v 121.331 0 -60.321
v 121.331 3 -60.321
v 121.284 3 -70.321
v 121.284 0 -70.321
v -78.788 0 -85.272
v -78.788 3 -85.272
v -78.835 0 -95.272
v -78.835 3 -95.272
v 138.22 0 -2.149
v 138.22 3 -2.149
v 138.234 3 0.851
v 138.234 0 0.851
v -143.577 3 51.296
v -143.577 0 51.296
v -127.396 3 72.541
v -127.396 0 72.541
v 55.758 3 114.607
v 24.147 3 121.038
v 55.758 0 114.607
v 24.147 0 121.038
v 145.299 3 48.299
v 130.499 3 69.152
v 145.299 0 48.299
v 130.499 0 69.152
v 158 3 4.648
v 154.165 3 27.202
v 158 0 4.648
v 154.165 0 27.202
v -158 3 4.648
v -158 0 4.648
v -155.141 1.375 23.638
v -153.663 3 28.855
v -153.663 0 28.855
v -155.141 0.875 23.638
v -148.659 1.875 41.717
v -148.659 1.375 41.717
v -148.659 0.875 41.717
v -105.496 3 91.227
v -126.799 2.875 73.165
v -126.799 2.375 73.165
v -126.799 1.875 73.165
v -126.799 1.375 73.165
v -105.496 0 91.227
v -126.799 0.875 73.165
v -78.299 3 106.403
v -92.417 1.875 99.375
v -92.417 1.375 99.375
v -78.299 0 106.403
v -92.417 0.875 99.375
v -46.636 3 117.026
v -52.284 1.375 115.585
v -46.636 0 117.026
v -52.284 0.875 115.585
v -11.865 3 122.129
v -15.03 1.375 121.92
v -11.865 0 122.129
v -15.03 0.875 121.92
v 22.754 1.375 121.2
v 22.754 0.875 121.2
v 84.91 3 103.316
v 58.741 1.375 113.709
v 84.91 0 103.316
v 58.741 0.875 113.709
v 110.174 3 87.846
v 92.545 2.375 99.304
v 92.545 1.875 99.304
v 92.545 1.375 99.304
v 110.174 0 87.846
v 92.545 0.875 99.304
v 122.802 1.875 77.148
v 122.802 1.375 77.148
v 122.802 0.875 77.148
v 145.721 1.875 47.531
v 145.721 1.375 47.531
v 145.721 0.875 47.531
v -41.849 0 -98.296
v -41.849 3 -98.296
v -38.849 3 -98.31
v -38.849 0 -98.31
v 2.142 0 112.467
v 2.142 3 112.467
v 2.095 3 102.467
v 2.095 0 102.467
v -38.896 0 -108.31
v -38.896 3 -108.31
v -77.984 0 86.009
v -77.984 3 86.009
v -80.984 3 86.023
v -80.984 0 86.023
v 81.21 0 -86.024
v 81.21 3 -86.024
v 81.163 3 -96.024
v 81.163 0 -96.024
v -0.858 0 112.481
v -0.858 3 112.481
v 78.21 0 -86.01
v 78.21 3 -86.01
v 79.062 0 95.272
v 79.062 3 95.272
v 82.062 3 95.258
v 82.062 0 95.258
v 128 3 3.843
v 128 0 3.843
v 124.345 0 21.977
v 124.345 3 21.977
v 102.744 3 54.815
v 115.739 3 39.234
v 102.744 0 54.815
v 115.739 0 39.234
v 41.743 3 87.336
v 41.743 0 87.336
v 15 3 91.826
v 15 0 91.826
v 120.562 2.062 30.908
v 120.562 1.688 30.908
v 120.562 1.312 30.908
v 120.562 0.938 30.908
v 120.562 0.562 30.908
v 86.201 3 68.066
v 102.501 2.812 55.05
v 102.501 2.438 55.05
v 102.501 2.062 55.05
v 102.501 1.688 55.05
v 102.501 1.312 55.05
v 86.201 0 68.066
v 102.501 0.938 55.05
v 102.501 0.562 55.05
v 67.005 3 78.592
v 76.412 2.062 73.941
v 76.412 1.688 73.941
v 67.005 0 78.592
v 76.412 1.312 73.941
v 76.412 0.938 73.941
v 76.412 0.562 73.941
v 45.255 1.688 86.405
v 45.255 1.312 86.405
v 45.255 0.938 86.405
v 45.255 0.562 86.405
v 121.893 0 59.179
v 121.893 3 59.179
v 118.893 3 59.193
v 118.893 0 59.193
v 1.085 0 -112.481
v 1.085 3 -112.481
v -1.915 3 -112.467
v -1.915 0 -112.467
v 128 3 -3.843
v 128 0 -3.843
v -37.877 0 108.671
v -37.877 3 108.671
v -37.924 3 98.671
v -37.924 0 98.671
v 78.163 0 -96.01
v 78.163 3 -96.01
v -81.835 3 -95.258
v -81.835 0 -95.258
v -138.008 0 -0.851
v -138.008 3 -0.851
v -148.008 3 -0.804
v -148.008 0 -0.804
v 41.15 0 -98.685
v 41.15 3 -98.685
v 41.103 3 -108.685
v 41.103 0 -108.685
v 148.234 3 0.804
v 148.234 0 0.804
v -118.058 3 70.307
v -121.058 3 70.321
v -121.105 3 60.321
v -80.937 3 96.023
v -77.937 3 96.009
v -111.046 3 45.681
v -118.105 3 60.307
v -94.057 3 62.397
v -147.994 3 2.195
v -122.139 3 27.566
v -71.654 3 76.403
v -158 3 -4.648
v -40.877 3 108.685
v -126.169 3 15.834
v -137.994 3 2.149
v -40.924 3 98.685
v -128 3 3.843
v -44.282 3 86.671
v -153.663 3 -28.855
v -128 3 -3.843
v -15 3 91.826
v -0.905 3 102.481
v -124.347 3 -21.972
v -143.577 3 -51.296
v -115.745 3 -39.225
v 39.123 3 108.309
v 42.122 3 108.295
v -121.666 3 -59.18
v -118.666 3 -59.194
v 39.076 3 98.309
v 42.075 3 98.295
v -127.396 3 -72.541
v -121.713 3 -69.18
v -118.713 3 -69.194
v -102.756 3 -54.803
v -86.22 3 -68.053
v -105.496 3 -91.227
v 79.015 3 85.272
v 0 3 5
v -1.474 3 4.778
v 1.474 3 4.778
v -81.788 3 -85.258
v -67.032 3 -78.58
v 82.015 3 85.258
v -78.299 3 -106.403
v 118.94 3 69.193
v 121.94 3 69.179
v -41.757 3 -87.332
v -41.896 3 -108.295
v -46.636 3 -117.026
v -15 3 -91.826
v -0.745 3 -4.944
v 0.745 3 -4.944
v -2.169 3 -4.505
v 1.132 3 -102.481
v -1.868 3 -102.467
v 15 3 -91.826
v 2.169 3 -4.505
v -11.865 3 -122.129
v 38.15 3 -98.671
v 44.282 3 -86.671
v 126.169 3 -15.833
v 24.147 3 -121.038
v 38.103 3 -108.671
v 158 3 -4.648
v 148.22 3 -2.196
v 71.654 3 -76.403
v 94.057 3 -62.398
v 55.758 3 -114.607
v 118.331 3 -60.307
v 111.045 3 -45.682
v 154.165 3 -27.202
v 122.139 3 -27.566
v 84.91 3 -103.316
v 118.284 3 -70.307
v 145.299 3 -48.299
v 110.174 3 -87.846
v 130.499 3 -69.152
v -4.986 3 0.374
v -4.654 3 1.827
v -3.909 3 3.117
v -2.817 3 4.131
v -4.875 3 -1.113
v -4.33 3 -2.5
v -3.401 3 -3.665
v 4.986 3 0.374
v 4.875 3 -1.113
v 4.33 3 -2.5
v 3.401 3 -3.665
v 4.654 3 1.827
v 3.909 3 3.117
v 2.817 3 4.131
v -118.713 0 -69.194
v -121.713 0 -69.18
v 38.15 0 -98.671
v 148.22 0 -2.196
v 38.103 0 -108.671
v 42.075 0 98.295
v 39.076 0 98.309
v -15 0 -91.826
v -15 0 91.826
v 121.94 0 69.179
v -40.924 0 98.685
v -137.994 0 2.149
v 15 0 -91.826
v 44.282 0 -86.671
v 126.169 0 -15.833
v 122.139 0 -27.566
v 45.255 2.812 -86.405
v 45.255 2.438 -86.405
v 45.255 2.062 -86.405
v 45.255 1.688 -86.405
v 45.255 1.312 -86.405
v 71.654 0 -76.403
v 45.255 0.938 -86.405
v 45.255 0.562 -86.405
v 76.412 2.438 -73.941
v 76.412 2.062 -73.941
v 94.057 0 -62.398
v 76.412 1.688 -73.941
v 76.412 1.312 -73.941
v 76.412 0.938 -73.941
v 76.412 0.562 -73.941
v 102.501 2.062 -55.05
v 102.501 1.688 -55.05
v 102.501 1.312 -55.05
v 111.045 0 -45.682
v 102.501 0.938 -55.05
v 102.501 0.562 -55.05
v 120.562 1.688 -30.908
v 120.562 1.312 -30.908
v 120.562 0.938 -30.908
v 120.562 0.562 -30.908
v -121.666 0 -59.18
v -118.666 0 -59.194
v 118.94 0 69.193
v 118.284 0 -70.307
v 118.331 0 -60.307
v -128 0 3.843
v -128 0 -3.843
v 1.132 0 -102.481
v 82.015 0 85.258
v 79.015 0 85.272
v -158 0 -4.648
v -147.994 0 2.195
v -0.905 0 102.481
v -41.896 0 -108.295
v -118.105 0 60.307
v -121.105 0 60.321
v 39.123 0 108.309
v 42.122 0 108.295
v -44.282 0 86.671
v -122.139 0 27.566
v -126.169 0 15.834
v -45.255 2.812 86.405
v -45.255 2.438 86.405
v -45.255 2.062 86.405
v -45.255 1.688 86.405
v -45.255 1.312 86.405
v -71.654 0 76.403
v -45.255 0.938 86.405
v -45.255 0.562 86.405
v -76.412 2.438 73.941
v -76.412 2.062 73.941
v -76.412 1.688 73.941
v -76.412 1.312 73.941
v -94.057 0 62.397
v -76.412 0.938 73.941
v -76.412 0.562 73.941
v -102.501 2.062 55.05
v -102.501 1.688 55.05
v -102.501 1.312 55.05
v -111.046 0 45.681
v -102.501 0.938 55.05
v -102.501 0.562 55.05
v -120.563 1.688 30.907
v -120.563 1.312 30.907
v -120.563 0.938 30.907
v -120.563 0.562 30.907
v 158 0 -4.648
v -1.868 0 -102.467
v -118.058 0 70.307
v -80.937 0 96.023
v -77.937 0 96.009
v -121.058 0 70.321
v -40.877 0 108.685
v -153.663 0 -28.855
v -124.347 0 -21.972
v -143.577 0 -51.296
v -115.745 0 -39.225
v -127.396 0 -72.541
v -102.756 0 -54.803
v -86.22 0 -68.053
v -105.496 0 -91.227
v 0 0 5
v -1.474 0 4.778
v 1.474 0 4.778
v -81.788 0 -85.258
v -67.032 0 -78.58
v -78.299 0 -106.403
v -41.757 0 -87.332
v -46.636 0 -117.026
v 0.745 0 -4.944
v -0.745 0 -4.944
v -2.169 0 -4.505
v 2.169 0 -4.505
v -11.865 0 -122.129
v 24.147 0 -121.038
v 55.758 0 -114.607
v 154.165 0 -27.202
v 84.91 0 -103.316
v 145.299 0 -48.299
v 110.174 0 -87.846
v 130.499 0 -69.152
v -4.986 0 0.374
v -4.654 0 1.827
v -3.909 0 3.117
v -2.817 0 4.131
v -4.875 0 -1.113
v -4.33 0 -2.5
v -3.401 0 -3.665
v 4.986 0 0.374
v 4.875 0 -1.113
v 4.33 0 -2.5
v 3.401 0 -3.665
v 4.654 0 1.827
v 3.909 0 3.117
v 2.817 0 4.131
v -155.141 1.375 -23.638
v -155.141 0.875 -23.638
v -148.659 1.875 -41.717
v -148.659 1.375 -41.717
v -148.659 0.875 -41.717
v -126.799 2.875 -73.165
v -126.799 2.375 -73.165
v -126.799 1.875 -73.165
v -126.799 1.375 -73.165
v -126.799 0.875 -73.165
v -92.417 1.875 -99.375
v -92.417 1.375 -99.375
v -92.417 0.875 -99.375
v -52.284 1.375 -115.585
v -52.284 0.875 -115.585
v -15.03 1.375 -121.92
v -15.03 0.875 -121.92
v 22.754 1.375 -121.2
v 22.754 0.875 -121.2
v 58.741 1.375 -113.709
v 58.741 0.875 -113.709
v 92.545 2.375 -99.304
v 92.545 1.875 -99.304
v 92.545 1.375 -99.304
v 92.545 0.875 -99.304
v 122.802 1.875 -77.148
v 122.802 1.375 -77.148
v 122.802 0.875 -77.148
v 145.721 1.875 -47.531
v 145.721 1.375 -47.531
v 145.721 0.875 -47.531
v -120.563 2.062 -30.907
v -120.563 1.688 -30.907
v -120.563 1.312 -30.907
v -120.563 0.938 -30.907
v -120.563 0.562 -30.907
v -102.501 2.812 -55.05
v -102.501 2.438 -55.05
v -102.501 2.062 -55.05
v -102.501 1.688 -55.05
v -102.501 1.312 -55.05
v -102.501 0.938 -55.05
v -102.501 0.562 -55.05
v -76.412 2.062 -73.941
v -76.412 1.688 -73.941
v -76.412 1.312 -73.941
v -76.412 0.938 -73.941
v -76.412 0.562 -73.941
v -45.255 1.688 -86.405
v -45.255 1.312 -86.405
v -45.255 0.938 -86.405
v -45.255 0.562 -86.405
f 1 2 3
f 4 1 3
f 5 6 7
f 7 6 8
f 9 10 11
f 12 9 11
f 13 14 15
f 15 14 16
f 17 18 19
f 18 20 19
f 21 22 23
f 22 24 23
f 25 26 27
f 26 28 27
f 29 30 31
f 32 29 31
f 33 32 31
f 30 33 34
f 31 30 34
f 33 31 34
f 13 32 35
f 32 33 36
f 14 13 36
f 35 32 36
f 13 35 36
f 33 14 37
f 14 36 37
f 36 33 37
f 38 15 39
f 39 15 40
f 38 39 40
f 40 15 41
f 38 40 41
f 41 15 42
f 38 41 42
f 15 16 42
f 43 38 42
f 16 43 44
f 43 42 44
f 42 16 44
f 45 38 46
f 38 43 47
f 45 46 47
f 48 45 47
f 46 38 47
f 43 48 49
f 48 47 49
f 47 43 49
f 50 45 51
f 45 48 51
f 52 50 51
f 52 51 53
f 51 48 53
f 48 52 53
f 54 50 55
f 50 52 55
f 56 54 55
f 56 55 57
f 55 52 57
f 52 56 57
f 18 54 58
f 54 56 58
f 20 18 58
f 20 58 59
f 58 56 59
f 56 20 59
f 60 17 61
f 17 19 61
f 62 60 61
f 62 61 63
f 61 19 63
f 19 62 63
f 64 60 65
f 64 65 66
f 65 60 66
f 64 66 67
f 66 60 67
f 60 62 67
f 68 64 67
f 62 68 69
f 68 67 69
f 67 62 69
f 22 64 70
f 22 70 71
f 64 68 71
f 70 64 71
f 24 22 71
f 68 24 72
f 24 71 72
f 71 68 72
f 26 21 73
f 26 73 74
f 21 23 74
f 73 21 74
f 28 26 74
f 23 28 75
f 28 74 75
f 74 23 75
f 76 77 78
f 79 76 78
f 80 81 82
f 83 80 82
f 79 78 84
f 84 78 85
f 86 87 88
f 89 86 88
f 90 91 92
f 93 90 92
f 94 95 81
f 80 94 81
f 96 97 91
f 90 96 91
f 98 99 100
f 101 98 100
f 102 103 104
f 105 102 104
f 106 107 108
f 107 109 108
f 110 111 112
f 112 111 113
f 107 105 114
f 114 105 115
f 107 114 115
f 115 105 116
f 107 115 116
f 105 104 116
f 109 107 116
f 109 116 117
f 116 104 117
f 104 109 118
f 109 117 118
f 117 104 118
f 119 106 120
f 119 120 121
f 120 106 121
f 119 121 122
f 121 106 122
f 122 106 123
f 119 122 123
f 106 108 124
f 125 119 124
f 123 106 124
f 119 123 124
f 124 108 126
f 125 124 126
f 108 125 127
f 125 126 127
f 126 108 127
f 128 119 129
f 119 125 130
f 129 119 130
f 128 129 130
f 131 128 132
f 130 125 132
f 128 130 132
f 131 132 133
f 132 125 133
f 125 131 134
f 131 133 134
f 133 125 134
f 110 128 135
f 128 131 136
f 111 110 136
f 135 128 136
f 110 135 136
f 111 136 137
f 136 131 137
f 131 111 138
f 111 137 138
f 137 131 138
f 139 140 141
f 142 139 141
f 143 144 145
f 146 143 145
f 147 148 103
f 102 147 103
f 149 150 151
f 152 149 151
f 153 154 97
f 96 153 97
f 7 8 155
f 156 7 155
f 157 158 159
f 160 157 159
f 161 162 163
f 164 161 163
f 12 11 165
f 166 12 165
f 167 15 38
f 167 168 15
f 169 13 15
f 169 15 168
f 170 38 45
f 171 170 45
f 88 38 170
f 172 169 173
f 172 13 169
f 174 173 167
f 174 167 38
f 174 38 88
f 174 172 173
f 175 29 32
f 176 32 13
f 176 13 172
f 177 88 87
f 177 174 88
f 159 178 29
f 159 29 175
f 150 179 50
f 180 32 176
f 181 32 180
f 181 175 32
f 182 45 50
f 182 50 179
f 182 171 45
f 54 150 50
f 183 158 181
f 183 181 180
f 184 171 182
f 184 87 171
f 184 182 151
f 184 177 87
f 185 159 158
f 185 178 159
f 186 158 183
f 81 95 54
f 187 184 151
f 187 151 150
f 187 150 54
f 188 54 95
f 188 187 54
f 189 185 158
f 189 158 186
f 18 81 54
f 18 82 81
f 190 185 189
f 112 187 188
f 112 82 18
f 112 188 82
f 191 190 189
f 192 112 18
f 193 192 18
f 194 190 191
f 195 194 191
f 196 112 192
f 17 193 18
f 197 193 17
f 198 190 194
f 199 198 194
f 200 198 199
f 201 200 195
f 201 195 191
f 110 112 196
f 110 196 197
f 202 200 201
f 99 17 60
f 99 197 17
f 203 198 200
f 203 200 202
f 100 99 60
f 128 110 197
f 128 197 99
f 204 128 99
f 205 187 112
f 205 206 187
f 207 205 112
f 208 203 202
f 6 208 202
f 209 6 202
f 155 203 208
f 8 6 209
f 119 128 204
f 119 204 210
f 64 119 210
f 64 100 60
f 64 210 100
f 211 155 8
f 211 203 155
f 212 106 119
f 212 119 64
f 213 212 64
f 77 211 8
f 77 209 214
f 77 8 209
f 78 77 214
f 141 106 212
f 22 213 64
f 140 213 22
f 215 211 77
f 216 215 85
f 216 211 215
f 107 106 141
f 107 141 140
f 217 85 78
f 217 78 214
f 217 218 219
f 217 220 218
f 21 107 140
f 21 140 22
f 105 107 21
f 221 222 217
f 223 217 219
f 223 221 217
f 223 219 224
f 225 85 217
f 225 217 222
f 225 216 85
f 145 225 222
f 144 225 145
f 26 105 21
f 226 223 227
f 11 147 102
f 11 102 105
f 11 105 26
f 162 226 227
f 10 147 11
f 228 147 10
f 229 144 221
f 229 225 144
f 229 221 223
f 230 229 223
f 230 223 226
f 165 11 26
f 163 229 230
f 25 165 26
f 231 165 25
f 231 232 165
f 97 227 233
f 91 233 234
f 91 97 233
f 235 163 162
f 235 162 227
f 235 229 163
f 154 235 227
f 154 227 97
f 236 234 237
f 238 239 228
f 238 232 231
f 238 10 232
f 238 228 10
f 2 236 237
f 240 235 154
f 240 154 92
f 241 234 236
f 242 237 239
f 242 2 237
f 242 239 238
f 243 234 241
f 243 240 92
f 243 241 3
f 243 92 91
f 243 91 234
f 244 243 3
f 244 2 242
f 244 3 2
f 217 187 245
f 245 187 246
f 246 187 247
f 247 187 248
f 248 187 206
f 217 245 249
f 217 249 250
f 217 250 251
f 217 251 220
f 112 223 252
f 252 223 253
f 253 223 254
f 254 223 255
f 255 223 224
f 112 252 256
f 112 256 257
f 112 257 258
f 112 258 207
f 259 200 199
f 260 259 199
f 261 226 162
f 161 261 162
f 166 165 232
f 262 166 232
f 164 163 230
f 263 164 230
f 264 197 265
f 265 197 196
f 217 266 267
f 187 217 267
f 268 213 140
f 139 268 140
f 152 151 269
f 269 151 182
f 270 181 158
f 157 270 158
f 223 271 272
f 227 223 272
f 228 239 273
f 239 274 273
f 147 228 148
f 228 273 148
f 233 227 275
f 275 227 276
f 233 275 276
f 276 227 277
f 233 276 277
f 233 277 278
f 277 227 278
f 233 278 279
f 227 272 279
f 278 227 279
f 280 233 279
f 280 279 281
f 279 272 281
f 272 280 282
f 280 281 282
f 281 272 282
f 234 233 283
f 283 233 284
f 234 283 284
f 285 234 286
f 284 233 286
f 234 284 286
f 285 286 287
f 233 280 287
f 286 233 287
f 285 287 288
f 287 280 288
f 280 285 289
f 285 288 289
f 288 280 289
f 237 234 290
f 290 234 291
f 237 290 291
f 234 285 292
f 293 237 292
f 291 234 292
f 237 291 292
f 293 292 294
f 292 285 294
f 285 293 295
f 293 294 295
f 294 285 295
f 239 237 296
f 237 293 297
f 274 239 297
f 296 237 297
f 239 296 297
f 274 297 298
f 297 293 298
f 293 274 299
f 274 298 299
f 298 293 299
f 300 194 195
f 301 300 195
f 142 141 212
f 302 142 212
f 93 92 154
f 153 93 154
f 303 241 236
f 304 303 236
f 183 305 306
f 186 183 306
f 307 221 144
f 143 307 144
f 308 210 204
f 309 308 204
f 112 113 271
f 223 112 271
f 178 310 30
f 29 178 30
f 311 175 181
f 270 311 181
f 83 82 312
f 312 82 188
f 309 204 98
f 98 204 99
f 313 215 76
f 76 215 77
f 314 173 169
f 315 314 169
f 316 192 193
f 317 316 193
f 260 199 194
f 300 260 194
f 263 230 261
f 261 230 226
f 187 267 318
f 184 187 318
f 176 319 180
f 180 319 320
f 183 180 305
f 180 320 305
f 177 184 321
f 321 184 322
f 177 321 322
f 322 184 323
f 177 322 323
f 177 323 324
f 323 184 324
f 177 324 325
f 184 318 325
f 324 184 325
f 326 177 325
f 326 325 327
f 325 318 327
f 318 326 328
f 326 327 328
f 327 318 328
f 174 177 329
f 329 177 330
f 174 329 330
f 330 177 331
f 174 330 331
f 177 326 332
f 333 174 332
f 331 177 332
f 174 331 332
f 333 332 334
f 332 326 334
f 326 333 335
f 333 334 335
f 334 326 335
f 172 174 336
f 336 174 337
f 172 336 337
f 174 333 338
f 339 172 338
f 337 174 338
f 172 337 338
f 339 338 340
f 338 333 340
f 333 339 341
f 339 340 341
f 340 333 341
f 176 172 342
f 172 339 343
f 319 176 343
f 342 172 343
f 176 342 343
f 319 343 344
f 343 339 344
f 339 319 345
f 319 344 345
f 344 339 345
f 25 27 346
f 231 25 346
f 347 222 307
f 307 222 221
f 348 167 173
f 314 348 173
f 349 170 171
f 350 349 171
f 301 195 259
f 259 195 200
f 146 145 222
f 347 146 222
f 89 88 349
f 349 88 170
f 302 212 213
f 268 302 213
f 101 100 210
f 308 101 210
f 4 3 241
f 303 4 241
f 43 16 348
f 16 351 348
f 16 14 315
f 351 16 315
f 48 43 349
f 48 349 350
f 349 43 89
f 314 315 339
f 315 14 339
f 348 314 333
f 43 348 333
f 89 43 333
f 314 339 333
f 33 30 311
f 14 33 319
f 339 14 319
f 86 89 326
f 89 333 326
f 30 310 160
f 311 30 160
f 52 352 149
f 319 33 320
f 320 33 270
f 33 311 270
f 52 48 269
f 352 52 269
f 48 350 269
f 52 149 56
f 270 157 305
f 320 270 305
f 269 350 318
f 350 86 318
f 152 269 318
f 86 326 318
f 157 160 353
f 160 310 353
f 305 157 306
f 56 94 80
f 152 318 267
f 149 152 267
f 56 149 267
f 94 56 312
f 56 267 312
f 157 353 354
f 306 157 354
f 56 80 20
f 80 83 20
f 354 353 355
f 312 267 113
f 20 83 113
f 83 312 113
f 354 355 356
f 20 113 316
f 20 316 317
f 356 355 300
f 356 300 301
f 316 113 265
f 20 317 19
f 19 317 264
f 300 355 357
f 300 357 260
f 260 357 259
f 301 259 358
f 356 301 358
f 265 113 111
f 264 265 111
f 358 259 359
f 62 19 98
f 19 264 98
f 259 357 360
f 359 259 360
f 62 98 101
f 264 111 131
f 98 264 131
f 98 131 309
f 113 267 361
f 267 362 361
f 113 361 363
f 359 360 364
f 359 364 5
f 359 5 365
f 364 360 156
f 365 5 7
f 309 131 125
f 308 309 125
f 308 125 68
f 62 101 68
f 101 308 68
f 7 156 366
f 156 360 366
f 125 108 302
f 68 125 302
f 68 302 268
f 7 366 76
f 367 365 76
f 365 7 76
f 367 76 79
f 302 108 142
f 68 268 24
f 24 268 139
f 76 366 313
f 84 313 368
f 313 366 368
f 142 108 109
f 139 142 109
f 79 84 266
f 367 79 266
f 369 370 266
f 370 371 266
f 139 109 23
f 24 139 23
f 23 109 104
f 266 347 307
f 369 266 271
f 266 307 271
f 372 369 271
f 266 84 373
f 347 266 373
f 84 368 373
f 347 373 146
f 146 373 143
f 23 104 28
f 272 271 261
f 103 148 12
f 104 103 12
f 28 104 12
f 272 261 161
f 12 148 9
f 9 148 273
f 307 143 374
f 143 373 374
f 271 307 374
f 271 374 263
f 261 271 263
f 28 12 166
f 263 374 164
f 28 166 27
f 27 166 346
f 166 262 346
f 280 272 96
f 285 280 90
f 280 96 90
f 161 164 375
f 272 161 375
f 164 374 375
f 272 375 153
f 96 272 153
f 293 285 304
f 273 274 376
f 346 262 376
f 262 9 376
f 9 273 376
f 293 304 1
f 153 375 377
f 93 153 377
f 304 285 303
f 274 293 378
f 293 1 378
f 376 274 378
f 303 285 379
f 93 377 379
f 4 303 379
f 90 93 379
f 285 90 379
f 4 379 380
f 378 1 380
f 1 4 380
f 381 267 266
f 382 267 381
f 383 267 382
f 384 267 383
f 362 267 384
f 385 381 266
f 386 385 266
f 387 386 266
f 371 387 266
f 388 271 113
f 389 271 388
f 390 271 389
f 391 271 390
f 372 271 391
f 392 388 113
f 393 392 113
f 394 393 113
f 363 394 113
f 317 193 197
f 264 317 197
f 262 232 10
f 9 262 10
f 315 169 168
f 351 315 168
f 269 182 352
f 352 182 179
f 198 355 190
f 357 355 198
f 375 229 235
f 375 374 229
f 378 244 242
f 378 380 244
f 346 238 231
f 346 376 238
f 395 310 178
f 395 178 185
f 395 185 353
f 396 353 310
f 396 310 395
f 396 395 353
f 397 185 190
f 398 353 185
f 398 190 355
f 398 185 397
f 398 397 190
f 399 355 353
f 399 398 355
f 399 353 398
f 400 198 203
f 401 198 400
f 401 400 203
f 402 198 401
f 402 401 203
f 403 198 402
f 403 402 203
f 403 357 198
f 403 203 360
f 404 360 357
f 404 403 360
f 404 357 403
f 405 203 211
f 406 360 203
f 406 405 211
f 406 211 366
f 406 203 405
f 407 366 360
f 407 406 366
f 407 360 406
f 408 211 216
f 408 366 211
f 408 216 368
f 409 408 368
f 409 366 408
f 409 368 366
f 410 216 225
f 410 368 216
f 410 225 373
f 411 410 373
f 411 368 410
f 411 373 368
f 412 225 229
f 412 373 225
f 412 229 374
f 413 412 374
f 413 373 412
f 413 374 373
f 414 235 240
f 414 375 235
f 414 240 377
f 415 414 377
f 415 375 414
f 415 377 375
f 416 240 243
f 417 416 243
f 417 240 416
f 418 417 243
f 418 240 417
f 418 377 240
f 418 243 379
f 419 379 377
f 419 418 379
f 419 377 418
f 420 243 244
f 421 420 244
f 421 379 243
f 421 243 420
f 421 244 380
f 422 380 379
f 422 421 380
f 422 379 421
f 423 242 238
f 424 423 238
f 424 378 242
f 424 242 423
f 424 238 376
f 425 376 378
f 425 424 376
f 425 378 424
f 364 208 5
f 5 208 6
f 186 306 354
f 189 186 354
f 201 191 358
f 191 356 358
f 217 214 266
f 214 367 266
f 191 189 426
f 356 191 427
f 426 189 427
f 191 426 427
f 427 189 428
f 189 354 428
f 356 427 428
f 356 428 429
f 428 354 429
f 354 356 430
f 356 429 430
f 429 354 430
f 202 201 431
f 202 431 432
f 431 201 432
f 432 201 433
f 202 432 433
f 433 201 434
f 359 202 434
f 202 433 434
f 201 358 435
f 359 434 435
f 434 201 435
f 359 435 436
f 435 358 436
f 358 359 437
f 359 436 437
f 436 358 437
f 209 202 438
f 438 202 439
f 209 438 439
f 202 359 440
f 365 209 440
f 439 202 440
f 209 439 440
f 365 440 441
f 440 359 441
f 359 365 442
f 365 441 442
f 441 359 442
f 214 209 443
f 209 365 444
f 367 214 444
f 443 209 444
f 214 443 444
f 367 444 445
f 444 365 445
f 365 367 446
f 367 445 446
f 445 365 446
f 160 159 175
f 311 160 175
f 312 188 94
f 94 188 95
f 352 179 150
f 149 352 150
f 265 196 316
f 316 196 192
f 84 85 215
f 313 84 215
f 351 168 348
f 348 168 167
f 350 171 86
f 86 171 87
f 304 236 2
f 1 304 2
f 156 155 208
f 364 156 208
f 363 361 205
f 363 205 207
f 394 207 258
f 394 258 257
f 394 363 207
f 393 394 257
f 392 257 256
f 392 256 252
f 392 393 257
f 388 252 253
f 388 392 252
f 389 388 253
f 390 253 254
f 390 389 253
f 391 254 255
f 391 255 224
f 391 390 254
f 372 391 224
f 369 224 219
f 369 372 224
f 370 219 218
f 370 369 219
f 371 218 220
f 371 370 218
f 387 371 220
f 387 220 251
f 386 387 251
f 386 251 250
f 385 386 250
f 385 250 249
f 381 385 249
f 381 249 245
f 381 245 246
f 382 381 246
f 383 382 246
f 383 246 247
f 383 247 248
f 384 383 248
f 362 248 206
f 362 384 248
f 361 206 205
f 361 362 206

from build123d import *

# Parameters (mm, degrees)
SKETCH_2_R          = 5
EXTRUDE_1_DEPTH     = 3
CUT_EXTRUDE_1_DEPTH = 200.932491601


with BuildPart() as part:
    # 草图2 → 凸台-拉伸1 (new body)
    with BuildSketch(Plane(origin=(0, 0, 0), x_dir=(1, 0, 0), z_dir=(0, 1, 0))):
        with BuildLine():
            add(Edge.make_bspline(
                [(-158, 4.647580015), (-157.840632623, 7.898309914), (-157.230923207, 14.322386142), (-155.452746954, 23.836708418), (-151.455463066, 36.074052553), (-145.999672069, 47.671836442), (-139.230379225, 58.550935995), (-131.318807935, 68.627343709), (-120.682359228, 79.66101812), (-106.314153227, 91.393620751), (-87.729388125, 102.749099806), (-64.740966029, 112.518967886), (-39.976202938, 119.201809502), (-14.818936259, 122.590822364), (10.300366837, 122.846161773), (35.006186274, 120.076750254), (58.936571944, 114.347737623), (81.928105159, 105.552677383), (101.115324182, 94.89380247), (116.213750165, 83.595995995), (127.601010627, 72.704005397), (135.860607987, 63.075817152), (142.879120728, 52.984121912), (148.765002816, 42.186376352), (154.133853951, 28.8835882), (156.763243516, 17.891175579), (157.749742083, 9.75226901), (158, 4.647580015)],
                knots=[0, 0, 0, 0, 0, 0.030050103, 0.059543416, 0.089055708, 0.11857173, 0.148087684, 0.177604234, 0.207120827, 0.259849884, 0.318883484, 0.377917011, 0.436950613, 0.495984189, 0.552632218, 0.609280233, 0.665928258, 0.722576279, 0.779224237, 0.811190919, 0.839514883, 0.867838217, 0.896161221, 0.924483933, 0.952811697, 1, 1, 1, 1, 1], degree=4))
            Line((-158, 4.647580015), (-158, -4.647580015))
            add(Edge.make_bspline(
                [(-158, -4.647580015), (-157.840632623, -7.898309914), (-157.230923207, -14.322386142), (-155.452746954, -23.836708418), (-151.455463066, -36.074052553), (-145.999672069, -47.671836442), (-139.230379225, -58.550935995), (-131.318807935, -68.627343709), (-120.682359228, -79.66101812), (-106.314153227, -91.393620751), (-87.729388125, -102.749099806), (-64.740966029, -112.518967886), (-39.976202938, -119.201809502), (-14.818936259, -122.590822364), (10.300366837, -122.846161773), (35.006186274, -120.076750254), (58.936571944, -114.347737623), (81.928105159, -105.552677383), (101.115324182, -94.89380247), (116.213750165, -83.595995995), (127.601010627, -72.704005397), (135.860607987, -63.075817152), (142.879120728, -52.984121912), (148.765002816, -42.186376352), (154.133853951, -28.8835882), (156.763243516, -17.891175579), (157.749742083, -9.75226901), (158, -4.647580015)],
                knots=[0, 0, 0, 0, 0, 0.030050103, 0.059543416, 0.089055708, 0.11857173, 0.148087684, 0.177604234, 0.207120827, 0.259849884, 0.318883484, 0.377917011, 0.436950613, 0.495984189, 0.552632218, 0.609280233, 0.665928258, 0.722576279, 0.779224237, 0.811190919, 0.839514883, 0.867838217, 0.896161221, 0.924483933, 0.952811697, 1, 1, 1, 1, 1], degree=4))
            Line((158, -4.647580015), (158, 4.647580015))
        make_face()
        with BuildLine():
            Line((14.99999999, -91.826221469), (14.99999999, 91.826221469))
            add(Edge.make_bspline(
                [(14.99999999, 91.826221469), (25.272065208, 90.935478506), (42.978337905, 87.784663449), (66.760356672, 79.331620625), (86.250252489, 68.789883395), (103.097371825, 55.45268215), (116.36700284, 39.700766823), (123.690358435, 25.137176558), (127.017736472, 13.034900149), (127.817421208, 6.922474495), (128, 3.843082438)],
                knots=[0.540645219, 0.540645219, 0.540645219, 0.540645219, 0.624438669, 0.68665808, 0.74887749, 0.8110969, 0.873316311, 0.935535721, 0.966645426, 0.997755131, 0.997755131, 0.997755131, 0.997755131], degree=3))
            Line((128, 3.843082438), (128, -3.843082438))
            add(Edge.make_bspline(
                [(128, -3.843082438), (127.817421208, -6.922474495), (127.017736472, -13.034900149), (123.690358435, -25.137176558), (116.36700284, -39.700766823), (103.097371825, -55.45268215), (86.250252489, -68.789883395), (66.760356672, -79.331620625), (42.978337905, -87.784663449), (25.272065208, -90.935478506), (14.99999999, -91.826221469)],
                knots=[0.002244566, 0.002244566, 0.002244566, 0.002244566, 0.033354271, 0.064463976, 0.126683386, 0.188902797, 0.251122207, 0.313341617, 0.375561028, 0.459354478, 0.459354478, 0.459354478, 0.459354478], degree=3))
        make_face(mode=Mode.SUBTRACT)
        with BuildLine():
            Line((-15, 91.826204625), (-15, -91.826204624))
            add(Edge.make_bspline(
                [(-15, -91.826204624), (-25.272129397, -90.935448732), (-42.978487926, -87.784616576), (-66.760338924, -79.331638367), (-86.250604016, -68.789751516), (-103.097493512, -55.452466033), (-116.367130615, -39.700780131), (-123.690887414, -25.135387447), (-127.01753099, -13.035584443), (-127.817439146, -6.922588381), (-128, -3.843132274)],
                knots=[0.540644858, 0.540644858, 0.540644858, 0.540644858, 0.624438669, 0.68665808, 0.74887749, 0.8110969, 0.873316311, 0.935535721, 0.966645426, 0.997755131, 0.997755131, 0.997755131, 0.997755131], degree=3))
            Line((-128, -3.843132274), (-128, 3.843132274))
            add(Edge.make_bspline(
                [(-128, 3.843132274), (-127.817439146, 6.922588381), (-127.01753099, 13.035584443), (-123.690887414, 25.135387447), (-116.367130615, 39.700780131), (-103.097493512, 55.452466033), (-86.250604016, 68.789751516), (-66.760338924, 79.331638367), (-42.978487926, 87.784616576), (-25.272129397, 90.935448732), (-15, 91.826204624)],
                knots=[0.002244566, 0.002244566, 0.002244566, 0.002244566, 0.033354271, 0.064463976, 0.126683386, 0.188902797, 0.251122207, 0.313341617, 0.375561028, 0.459354839, 0.459354839, 0.459354839, 0.459354839], degree=3))
        make_face(mode=Mode.SUBTRACT)
        Circle(SKETCH_2_R, mode=Mode.SUBTRACT)
    extrude(amount=EXTRUDE_1_DEPTH)

    # 草图3 → 切除-拉伸1 (cut, through all)
    with BuildSketch(Plane(origin=(0, 3, 0), x_dir=(1, 0, 0), z_dir=(0, 1, 0))):
        Polygon((79.061701734, -95.271659003), (82.061668628, -95.257565394), (82.014689931, -85.257675744), (79.014723036, -85.271769353), align=None)
        Polygon((121.892616384, -59.179131978), (118.892649489, -59.193225587), (118.939628187, -69.193115237), (121.939595081, -69.179021627), align=None)
        Polygon((-0.858334219, -112.480728906), (2.141632676, -112.466635297), (2.094653978, -102.466745647), (-0.905312917, -102.480839257), align=None)
        Polygon((-37.87664199, -108.670646183), (-37.923620688, -98.670756533), (-40.923587583, -98.684850143), (-40.876608885, -108.684739792), align=None)
        Polygon((42.122475205, -108.294816603), (42.075496508, -98.294926953), (39.075529613, -98.309020563), (39.122508311, -108.308910212), align=None)
        Polygon((138.220248888, 2.149150661), (138.234342497, -0.850816234), (148.234232146, -0.803837537), (148.220138537, 2.196129358), align=None)
        Polygon((121.284233788, 70.321240537), (118.284266893, 70.307146928), (118.33124559, 60.307257278), (121.331212485, 60.321350887), align=None)
        Polygon((78.16307615, 96.009861114), (78.210054848, 86.009971464), (81.210021742, 86.024065074), (81.163043045, 96.023954723), align=None)
        Polygon((38.103152377, 108.671282743), (38.150131075, 98.671393094), (41.150097969, 98.685486703), (41.103119272, 108.685376352), align=None)
        Polygon((-1.868143592, 102.467382207), (1.131823303, 102.481475817), (1.084844606, 112.481365466), (-1.915122289, 112.467271857), align=None)
        Polygon((-41.895964819, 108.295453163), (-41.848986121, 98.295563514), (-38.849019226, 98.309657123), (-38.895997924, 108.309546772), align=None)
        Polygon((-81.835158242, 95.258201954), (-81.788179544, 85.258312304), (-78.788212649, 85.272405914), (-78.835191347, 95.272295563), align=None)
        Polygon((-118.7131178, 69.193751797), (-121.713084695, 69.179658188), (-121.666105997, 59.179768538), (-118.666139102, 59.193862147), align=None)
        Polygon((-148.00772176, 0.804474097), (-147.993628151, -2.195492798), (-137.993738501, -2.1485141), (-138.00783211, 0.851452795), align=None)
        Polygon((-118.104735204, -60.306620718), (-121.104702099, -60.320714327), (-121.057723401, -70.320603977), (-118.057756506, -70.306510367), align=None)
        Polygon((-80.936532658, -96.023318163), (-77.936565763, -96.009224554), (-77.983544461, -86.009334904), (-80.983511356, -86.023428513), align=None)
    extrude(amount=-CUT_EXTRUDE_1_DEPTH, mode=Mode.SUBTRACT)


solid = part.part
